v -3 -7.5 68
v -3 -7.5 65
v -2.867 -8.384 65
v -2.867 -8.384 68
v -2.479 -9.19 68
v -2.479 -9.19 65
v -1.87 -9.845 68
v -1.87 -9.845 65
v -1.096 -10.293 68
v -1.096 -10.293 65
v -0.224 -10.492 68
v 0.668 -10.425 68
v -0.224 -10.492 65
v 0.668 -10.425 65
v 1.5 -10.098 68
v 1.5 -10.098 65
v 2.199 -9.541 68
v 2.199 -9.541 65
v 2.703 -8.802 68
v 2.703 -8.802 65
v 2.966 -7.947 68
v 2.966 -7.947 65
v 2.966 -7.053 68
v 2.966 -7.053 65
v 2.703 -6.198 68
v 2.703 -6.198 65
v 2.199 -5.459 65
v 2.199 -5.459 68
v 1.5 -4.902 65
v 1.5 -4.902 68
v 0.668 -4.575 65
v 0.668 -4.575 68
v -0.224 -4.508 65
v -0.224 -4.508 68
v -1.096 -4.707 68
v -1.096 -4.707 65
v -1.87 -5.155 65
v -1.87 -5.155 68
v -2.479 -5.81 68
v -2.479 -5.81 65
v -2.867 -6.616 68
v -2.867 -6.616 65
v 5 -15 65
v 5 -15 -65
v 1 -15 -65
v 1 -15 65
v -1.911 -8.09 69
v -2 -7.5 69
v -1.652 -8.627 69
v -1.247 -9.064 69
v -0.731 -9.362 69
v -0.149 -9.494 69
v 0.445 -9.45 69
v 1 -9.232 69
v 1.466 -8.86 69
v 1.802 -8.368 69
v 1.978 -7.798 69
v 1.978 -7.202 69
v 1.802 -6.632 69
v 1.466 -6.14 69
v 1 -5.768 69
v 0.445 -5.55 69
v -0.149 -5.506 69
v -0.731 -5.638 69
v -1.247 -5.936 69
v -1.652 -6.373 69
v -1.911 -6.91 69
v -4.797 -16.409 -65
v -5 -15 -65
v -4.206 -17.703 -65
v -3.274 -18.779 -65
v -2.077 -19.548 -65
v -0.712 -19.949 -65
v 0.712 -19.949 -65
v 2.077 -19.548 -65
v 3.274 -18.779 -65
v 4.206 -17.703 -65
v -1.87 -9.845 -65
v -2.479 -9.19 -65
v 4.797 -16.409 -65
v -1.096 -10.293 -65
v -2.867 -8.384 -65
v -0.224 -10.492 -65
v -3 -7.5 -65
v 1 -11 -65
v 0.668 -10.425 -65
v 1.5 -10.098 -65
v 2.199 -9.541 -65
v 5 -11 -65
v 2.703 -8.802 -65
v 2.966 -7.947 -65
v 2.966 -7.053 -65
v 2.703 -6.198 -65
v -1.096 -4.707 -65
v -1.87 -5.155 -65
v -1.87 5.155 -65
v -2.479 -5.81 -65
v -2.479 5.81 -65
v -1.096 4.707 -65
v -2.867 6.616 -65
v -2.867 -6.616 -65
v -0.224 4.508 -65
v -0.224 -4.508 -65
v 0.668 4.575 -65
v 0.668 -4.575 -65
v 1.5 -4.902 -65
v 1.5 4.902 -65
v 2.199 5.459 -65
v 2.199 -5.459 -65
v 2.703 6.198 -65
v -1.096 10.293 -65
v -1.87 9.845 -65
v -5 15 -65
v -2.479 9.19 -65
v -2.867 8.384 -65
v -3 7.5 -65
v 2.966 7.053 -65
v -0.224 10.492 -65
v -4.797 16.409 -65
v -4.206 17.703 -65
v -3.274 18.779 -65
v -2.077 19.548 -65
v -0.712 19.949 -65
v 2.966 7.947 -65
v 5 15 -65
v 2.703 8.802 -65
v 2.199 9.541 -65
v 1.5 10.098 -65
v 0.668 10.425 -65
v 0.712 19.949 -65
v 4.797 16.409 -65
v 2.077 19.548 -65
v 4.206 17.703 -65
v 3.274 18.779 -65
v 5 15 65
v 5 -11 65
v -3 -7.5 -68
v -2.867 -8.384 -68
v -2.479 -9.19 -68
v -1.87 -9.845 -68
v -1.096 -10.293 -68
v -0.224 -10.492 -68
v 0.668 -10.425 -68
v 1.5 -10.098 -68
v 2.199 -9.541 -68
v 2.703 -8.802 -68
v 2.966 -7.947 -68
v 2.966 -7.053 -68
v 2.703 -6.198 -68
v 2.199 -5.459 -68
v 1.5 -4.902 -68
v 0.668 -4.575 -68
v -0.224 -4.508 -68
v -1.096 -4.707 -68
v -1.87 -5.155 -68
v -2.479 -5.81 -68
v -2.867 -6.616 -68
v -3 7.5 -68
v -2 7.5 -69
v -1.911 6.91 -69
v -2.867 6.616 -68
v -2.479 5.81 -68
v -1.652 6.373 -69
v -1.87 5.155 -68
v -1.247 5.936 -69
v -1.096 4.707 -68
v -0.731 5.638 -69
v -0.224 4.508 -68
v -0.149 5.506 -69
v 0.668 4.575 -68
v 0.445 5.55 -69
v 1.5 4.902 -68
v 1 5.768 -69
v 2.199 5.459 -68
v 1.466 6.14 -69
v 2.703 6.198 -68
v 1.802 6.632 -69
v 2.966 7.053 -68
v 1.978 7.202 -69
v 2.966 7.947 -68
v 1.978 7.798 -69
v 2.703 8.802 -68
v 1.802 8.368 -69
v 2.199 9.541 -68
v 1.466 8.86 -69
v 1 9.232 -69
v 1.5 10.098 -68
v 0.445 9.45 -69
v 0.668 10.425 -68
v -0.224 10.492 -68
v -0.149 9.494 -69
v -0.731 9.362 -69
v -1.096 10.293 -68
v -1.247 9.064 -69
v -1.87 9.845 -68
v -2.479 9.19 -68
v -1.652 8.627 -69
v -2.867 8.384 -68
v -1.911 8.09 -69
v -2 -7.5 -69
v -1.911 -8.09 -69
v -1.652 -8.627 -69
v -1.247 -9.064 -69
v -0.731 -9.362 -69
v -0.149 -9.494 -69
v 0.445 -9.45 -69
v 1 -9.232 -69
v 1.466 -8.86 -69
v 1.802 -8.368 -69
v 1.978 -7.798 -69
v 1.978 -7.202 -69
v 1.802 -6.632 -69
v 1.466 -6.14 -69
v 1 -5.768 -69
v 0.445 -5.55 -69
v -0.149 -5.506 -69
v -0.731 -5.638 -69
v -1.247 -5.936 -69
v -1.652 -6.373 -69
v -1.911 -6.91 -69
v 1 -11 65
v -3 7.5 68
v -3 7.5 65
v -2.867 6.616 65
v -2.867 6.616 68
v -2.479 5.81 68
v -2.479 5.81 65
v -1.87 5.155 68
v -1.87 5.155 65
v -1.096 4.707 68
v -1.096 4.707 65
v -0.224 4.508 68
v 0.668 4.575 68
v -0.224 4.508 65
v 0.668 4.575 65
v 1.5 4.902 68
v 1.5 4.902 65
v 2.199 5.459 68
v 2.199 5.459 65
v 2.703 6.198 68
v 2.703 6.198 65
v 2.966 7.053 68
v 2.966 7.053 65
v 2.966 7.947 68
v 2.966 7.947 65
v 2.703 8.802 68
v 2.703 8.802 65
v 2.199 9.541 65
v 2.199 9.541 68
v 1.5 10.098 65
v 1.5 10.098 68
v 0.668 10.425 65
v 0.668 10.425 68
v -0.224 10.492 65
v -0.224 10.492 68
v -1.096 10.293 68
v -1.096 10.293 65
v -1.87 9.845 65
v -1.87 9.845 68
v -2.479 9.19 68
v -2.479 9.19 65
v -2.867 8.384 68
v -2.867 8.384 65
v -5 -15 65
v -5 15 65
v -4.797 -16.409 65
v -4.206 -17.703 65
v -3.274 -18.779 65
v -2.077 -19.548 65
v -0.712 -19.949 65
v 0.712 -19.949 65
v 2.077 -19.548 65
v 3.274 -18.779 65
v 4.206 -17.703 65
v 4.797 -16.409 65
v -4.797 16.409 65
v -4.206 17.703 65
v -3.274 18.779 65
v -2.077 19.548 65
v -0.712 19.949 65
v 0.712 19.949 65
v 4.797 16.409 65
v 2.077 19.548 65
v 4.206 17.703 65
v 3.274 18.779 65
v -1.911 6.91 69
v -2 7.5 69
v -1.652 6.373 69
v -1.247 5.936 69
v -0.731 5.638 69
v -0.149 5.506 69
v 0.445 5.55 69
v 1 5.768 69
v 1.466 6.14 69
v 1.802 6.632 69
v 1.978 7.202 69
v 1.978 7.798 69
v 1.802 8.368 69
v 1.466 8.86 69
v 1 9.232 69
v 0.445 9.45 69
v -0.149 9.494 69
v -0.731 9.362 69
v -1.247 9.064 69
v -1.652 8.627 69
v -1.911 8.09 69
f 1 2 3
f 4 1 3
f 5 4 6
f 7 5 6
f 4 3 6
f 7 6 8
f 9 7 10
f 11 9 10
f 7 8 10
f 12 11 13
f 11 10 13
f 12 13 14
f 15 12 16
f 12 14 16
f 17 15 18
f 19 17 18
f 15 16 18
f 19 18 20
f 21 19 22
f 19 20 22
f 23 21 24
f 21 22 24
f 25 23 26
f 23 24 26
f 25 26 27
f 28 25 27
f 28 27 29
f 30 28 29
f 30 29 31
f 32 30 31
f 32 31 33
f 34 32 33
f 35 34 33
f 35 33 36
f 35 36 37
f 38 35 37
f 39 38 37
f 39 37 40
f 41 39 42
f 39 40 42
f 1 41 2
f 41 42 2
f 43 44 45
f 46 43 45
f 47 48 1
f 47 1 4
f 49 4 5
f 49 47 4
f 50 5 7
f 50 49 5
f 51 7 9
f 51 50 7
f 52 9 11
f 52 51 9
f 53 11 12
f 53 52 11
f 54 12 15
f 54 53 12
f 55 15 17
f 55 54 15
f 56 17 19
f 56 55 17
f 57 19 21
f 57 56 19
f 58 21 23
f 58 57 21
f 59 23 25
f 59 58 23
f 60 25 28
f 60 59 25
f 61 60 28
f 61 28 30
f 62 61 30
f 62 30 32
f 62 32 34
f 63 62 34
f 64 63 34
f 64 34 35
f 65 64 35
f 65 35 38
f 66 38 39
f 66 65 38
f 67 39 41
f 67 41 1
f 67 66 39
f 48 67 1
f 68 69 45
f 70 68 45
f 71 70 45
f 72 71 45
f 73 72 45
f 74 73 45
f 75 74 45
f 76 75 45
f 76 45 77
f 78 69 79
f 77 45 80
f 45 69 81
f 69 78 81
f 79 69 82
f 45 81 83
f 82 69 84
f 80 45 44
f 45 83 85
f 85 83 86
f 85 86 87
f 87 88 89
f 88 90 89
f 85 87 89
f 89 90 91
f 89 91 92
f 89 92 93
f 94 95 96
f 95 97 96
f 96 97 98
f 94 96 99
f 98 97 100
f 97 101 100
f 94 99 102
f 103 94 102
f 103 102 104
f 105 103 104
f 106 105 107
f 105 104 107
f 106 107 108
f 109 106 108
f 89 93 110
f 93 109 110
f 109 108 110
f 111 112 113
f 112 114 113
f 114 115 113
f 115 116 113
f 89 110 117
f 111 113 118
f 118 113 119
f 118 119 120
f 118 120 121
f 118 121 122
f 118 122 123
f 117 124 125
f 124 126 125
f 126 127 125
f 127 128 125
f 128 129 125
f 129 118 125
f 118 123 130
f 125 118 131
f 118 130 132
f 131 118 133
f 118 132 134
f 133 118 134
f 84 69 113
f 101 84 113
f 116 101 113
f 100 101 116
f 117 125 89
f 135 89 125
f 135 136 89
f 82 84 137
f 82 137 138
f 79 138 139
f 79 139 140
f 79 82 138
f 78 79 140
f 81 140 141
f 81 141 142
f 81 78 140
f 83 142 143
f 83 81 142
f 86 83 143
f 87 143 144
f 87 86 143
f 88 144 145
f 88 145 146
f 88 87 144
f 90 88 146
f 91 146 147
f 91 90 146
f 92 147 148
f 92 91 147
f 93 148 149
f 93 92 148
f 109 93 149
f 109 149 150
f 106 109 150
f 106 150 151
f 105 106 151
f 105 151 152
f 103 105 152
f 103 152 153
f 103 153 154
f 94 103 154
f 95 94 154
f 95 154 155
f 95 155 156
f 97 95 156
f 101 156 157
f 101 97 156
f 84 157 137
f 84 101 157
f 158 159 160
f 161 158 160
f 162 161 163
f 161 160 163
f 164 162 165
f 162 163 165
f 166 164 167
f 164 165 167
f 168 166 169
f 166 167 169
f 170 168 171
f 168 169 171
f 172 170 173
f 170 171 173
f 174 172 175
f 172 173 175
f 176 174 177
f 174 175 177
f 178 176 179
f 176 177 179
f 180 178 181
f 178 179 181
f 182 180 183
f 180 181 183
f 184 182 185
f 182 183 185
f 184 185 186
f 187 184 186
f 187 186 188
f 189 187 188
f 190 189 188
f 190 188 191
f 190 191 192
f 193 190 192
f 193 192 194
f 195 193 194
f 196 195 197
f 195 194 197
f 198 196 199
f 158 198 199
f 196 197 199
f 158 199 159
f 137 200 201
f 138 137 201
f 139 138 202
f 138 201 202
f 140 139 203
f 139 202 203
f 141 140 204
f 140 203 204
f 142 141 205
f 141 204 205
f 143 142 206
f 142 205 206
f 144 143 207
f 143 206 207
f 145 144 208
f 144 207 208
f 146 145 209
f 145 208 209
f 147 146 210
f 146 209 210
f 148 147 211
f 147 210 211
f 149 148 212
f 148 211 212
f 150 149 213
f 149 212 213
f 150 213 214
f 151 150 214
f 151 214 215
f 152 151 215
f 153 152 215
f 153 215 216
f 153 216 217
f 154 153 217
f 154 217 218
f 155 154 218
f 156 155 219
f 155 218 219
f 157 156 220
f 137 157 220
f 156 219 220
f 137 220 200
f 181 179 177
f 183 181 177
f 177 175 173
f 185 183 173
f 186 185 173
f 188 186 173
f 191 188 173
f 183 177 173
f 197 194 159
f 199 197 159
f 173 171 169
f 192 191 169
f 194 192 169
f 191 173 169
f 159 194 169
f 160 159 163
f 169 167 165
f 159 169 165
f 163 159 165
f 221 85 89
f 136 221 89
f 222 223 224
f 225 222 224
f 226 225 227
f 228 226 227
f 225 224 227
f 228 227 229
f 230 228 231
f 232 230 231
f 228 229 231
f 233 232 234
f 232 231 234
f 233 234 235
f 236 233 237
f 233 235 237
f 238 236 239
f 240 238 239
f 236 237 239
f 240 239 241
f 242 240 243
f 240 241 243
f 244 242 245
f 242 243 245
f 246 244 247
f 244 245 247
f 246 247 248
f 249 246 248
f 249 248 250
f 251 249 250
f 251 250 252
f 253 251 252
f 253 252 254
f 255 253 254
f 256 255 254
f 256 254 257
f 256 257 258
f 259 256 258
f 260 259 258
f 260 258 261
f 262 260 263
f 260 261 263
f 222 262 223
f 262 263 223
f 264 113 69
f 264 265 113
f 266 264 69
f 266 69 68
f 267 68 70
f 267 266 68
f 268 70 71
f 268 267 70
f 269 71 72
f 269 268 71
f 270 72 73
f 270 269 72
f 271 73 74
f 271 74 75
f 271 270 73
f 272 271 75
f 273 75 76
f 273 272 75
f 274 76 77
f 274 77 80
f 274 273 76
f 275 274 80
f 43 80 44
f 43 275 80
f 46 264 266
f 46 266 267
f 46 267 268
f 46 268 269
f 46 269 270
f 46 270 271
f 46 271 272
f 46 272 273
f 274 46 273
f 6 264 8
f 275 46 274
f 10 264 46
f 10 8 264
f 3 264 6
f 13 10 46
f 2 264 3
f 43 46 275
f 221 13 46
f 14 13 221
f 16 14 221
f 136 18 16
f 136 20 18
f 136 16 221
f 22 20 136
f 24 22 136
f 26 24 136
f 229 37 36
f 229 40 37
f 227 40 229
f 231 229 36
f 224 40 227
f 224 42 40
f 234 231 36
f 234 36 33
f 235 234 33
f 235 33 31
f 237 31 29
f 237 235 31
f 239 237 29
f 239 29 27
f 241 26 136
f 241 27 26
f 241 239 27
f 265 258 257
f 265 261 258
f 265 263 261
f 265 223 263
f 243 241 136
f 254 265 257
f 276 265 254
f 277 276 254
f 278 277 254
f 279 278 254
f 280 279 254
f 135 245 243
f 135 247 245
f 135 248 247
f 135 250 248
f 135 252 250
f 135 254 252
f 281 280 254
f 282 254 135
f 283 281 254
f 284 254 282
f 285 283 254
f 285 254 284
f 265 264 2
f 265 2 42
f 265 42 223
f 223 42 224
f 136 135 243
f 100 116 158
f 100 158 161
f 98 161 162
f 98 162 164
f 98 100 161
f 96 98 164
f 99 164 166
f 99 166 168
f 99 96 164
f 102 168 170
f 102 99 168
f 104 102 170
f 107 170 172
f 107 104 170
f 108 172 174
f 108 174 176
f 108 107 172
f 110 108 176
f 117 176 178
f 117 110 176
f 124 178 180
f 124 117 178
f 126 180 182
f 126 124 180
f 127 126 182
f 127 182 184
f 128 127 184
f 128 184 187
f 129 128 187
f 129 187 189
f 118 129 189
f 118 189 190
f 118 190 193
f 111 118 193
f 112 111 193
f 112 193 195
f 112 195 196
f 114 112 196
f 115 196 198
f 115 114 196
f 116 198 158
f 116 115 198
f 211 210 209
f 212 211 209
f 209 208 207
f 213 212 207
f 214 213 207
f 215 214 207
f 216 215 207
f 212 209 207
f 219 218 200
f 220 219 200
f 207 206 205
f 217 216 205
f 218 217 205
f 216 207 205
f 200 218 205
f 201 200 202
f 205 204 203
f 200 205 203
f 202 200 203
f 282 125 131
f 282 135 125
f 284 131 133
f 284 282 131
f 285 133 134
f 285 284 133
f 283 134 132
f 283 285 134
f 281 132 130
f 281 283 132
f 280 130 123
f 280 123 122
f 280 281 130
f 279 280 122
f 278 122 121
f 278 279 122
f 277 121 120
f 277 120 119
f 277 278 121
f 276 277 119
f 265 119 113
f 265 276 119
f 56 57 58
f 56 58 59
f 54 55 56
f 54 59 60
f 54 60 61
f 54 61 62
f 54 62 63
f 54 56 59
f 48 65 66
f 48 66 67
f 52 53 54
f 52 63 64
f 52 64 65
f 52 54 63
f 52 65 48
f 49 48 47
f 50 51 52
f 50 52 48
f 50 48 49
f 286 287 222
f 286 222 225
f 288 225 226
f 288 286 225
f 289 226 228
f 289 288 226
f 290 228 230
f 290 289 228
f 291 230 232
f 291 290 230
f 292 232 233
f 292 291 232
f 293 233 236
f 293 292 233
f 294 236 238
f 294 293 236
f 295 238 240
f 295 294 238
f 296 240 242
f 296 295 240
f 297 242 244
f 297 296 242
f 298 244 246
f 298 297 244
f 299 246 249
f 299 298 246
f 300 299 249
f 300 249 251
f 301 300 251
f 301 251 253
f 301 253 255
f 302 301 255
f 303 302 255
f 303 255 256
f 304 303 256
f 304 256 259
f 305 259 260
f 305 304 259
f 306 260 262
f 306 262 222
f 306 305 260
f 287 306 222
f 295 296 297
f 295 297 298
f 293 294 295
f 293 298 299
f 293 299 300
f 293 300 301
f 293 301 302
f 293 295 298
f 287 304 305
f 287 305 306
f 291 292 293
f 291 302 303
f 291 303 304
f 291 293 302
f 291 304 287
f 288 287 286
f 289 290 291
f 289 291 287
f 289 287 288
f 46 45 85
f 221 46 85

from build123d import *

# Parameters (mm, degrees)
EXTRUDE_1_DEPTH            = 65
SKETCH_2_R                 = 3
EXTRUDE_2_DEPTH            = 4
CHAMFER_1_SIZE             = 1
CHAMFER_1_OF_MIRROR_1_SIZE = 1


with BuildPart() as part:
    # 草圖1 → 伸長1 (new, symmetric)
    with BuildSketch(Plane.XY):
        with BuildLine():
            Line((-5, 15), (-5, -15))
            ThreePointArc((-5, -15), (0, -20), (5, -15))
            Line((5, -15), (1, -15))
            Line((1, -15), (1, -11))
            Line((1, -11), (5, -11))
            Line((5, -11), (5, 15))
            ThreePointArc((5, 15), (0, 20), (-5, 15))
        make_face()
    extrude(amount=EXTRUDE_1_DEPTH, both=True)

    # 草圖2 → 伸長2 (add)
    with BuildSketch(Plane.XY.offset(65)):
        with Locations(Location((0, 7.5, 0), (0, 0, 180))):
            Circle(SKETCH_2_R)
        with Locations(Location((0, -7.5, 0), (0, 0, 180))):
            Circle(SKETCH_2_R)
    extrude_2 = extrude(amount=EXTRUDE_2_DEPTH)

    # 導角1
    chamfer_1_edges = [part.edges().sort_by_distance(p)[0] for p in [
        (3, 7.5, 69),
        (3, -7.5, 69),
    ]]
    chamfer(chamfer_1_edges, length=CHAMFER_1_SIZE)

    # 鏡射1: 伸長2 across plane
    add(extrude_2.mirror(Plane.XY))

    # 導角1 of 鏡射1
    chamfer_1_of_mirror_1_edges = [part.edges().sort_by_distance(p)[0] for p in [
        (3, 7.5, -69),
        (3, -7.5, -69),
    ]]
    chamfer(chamfer_1_of_mirror_1_edges, length=CHAMFER_1_OF_MIRROR_1_SIZE)


solid = part.part
